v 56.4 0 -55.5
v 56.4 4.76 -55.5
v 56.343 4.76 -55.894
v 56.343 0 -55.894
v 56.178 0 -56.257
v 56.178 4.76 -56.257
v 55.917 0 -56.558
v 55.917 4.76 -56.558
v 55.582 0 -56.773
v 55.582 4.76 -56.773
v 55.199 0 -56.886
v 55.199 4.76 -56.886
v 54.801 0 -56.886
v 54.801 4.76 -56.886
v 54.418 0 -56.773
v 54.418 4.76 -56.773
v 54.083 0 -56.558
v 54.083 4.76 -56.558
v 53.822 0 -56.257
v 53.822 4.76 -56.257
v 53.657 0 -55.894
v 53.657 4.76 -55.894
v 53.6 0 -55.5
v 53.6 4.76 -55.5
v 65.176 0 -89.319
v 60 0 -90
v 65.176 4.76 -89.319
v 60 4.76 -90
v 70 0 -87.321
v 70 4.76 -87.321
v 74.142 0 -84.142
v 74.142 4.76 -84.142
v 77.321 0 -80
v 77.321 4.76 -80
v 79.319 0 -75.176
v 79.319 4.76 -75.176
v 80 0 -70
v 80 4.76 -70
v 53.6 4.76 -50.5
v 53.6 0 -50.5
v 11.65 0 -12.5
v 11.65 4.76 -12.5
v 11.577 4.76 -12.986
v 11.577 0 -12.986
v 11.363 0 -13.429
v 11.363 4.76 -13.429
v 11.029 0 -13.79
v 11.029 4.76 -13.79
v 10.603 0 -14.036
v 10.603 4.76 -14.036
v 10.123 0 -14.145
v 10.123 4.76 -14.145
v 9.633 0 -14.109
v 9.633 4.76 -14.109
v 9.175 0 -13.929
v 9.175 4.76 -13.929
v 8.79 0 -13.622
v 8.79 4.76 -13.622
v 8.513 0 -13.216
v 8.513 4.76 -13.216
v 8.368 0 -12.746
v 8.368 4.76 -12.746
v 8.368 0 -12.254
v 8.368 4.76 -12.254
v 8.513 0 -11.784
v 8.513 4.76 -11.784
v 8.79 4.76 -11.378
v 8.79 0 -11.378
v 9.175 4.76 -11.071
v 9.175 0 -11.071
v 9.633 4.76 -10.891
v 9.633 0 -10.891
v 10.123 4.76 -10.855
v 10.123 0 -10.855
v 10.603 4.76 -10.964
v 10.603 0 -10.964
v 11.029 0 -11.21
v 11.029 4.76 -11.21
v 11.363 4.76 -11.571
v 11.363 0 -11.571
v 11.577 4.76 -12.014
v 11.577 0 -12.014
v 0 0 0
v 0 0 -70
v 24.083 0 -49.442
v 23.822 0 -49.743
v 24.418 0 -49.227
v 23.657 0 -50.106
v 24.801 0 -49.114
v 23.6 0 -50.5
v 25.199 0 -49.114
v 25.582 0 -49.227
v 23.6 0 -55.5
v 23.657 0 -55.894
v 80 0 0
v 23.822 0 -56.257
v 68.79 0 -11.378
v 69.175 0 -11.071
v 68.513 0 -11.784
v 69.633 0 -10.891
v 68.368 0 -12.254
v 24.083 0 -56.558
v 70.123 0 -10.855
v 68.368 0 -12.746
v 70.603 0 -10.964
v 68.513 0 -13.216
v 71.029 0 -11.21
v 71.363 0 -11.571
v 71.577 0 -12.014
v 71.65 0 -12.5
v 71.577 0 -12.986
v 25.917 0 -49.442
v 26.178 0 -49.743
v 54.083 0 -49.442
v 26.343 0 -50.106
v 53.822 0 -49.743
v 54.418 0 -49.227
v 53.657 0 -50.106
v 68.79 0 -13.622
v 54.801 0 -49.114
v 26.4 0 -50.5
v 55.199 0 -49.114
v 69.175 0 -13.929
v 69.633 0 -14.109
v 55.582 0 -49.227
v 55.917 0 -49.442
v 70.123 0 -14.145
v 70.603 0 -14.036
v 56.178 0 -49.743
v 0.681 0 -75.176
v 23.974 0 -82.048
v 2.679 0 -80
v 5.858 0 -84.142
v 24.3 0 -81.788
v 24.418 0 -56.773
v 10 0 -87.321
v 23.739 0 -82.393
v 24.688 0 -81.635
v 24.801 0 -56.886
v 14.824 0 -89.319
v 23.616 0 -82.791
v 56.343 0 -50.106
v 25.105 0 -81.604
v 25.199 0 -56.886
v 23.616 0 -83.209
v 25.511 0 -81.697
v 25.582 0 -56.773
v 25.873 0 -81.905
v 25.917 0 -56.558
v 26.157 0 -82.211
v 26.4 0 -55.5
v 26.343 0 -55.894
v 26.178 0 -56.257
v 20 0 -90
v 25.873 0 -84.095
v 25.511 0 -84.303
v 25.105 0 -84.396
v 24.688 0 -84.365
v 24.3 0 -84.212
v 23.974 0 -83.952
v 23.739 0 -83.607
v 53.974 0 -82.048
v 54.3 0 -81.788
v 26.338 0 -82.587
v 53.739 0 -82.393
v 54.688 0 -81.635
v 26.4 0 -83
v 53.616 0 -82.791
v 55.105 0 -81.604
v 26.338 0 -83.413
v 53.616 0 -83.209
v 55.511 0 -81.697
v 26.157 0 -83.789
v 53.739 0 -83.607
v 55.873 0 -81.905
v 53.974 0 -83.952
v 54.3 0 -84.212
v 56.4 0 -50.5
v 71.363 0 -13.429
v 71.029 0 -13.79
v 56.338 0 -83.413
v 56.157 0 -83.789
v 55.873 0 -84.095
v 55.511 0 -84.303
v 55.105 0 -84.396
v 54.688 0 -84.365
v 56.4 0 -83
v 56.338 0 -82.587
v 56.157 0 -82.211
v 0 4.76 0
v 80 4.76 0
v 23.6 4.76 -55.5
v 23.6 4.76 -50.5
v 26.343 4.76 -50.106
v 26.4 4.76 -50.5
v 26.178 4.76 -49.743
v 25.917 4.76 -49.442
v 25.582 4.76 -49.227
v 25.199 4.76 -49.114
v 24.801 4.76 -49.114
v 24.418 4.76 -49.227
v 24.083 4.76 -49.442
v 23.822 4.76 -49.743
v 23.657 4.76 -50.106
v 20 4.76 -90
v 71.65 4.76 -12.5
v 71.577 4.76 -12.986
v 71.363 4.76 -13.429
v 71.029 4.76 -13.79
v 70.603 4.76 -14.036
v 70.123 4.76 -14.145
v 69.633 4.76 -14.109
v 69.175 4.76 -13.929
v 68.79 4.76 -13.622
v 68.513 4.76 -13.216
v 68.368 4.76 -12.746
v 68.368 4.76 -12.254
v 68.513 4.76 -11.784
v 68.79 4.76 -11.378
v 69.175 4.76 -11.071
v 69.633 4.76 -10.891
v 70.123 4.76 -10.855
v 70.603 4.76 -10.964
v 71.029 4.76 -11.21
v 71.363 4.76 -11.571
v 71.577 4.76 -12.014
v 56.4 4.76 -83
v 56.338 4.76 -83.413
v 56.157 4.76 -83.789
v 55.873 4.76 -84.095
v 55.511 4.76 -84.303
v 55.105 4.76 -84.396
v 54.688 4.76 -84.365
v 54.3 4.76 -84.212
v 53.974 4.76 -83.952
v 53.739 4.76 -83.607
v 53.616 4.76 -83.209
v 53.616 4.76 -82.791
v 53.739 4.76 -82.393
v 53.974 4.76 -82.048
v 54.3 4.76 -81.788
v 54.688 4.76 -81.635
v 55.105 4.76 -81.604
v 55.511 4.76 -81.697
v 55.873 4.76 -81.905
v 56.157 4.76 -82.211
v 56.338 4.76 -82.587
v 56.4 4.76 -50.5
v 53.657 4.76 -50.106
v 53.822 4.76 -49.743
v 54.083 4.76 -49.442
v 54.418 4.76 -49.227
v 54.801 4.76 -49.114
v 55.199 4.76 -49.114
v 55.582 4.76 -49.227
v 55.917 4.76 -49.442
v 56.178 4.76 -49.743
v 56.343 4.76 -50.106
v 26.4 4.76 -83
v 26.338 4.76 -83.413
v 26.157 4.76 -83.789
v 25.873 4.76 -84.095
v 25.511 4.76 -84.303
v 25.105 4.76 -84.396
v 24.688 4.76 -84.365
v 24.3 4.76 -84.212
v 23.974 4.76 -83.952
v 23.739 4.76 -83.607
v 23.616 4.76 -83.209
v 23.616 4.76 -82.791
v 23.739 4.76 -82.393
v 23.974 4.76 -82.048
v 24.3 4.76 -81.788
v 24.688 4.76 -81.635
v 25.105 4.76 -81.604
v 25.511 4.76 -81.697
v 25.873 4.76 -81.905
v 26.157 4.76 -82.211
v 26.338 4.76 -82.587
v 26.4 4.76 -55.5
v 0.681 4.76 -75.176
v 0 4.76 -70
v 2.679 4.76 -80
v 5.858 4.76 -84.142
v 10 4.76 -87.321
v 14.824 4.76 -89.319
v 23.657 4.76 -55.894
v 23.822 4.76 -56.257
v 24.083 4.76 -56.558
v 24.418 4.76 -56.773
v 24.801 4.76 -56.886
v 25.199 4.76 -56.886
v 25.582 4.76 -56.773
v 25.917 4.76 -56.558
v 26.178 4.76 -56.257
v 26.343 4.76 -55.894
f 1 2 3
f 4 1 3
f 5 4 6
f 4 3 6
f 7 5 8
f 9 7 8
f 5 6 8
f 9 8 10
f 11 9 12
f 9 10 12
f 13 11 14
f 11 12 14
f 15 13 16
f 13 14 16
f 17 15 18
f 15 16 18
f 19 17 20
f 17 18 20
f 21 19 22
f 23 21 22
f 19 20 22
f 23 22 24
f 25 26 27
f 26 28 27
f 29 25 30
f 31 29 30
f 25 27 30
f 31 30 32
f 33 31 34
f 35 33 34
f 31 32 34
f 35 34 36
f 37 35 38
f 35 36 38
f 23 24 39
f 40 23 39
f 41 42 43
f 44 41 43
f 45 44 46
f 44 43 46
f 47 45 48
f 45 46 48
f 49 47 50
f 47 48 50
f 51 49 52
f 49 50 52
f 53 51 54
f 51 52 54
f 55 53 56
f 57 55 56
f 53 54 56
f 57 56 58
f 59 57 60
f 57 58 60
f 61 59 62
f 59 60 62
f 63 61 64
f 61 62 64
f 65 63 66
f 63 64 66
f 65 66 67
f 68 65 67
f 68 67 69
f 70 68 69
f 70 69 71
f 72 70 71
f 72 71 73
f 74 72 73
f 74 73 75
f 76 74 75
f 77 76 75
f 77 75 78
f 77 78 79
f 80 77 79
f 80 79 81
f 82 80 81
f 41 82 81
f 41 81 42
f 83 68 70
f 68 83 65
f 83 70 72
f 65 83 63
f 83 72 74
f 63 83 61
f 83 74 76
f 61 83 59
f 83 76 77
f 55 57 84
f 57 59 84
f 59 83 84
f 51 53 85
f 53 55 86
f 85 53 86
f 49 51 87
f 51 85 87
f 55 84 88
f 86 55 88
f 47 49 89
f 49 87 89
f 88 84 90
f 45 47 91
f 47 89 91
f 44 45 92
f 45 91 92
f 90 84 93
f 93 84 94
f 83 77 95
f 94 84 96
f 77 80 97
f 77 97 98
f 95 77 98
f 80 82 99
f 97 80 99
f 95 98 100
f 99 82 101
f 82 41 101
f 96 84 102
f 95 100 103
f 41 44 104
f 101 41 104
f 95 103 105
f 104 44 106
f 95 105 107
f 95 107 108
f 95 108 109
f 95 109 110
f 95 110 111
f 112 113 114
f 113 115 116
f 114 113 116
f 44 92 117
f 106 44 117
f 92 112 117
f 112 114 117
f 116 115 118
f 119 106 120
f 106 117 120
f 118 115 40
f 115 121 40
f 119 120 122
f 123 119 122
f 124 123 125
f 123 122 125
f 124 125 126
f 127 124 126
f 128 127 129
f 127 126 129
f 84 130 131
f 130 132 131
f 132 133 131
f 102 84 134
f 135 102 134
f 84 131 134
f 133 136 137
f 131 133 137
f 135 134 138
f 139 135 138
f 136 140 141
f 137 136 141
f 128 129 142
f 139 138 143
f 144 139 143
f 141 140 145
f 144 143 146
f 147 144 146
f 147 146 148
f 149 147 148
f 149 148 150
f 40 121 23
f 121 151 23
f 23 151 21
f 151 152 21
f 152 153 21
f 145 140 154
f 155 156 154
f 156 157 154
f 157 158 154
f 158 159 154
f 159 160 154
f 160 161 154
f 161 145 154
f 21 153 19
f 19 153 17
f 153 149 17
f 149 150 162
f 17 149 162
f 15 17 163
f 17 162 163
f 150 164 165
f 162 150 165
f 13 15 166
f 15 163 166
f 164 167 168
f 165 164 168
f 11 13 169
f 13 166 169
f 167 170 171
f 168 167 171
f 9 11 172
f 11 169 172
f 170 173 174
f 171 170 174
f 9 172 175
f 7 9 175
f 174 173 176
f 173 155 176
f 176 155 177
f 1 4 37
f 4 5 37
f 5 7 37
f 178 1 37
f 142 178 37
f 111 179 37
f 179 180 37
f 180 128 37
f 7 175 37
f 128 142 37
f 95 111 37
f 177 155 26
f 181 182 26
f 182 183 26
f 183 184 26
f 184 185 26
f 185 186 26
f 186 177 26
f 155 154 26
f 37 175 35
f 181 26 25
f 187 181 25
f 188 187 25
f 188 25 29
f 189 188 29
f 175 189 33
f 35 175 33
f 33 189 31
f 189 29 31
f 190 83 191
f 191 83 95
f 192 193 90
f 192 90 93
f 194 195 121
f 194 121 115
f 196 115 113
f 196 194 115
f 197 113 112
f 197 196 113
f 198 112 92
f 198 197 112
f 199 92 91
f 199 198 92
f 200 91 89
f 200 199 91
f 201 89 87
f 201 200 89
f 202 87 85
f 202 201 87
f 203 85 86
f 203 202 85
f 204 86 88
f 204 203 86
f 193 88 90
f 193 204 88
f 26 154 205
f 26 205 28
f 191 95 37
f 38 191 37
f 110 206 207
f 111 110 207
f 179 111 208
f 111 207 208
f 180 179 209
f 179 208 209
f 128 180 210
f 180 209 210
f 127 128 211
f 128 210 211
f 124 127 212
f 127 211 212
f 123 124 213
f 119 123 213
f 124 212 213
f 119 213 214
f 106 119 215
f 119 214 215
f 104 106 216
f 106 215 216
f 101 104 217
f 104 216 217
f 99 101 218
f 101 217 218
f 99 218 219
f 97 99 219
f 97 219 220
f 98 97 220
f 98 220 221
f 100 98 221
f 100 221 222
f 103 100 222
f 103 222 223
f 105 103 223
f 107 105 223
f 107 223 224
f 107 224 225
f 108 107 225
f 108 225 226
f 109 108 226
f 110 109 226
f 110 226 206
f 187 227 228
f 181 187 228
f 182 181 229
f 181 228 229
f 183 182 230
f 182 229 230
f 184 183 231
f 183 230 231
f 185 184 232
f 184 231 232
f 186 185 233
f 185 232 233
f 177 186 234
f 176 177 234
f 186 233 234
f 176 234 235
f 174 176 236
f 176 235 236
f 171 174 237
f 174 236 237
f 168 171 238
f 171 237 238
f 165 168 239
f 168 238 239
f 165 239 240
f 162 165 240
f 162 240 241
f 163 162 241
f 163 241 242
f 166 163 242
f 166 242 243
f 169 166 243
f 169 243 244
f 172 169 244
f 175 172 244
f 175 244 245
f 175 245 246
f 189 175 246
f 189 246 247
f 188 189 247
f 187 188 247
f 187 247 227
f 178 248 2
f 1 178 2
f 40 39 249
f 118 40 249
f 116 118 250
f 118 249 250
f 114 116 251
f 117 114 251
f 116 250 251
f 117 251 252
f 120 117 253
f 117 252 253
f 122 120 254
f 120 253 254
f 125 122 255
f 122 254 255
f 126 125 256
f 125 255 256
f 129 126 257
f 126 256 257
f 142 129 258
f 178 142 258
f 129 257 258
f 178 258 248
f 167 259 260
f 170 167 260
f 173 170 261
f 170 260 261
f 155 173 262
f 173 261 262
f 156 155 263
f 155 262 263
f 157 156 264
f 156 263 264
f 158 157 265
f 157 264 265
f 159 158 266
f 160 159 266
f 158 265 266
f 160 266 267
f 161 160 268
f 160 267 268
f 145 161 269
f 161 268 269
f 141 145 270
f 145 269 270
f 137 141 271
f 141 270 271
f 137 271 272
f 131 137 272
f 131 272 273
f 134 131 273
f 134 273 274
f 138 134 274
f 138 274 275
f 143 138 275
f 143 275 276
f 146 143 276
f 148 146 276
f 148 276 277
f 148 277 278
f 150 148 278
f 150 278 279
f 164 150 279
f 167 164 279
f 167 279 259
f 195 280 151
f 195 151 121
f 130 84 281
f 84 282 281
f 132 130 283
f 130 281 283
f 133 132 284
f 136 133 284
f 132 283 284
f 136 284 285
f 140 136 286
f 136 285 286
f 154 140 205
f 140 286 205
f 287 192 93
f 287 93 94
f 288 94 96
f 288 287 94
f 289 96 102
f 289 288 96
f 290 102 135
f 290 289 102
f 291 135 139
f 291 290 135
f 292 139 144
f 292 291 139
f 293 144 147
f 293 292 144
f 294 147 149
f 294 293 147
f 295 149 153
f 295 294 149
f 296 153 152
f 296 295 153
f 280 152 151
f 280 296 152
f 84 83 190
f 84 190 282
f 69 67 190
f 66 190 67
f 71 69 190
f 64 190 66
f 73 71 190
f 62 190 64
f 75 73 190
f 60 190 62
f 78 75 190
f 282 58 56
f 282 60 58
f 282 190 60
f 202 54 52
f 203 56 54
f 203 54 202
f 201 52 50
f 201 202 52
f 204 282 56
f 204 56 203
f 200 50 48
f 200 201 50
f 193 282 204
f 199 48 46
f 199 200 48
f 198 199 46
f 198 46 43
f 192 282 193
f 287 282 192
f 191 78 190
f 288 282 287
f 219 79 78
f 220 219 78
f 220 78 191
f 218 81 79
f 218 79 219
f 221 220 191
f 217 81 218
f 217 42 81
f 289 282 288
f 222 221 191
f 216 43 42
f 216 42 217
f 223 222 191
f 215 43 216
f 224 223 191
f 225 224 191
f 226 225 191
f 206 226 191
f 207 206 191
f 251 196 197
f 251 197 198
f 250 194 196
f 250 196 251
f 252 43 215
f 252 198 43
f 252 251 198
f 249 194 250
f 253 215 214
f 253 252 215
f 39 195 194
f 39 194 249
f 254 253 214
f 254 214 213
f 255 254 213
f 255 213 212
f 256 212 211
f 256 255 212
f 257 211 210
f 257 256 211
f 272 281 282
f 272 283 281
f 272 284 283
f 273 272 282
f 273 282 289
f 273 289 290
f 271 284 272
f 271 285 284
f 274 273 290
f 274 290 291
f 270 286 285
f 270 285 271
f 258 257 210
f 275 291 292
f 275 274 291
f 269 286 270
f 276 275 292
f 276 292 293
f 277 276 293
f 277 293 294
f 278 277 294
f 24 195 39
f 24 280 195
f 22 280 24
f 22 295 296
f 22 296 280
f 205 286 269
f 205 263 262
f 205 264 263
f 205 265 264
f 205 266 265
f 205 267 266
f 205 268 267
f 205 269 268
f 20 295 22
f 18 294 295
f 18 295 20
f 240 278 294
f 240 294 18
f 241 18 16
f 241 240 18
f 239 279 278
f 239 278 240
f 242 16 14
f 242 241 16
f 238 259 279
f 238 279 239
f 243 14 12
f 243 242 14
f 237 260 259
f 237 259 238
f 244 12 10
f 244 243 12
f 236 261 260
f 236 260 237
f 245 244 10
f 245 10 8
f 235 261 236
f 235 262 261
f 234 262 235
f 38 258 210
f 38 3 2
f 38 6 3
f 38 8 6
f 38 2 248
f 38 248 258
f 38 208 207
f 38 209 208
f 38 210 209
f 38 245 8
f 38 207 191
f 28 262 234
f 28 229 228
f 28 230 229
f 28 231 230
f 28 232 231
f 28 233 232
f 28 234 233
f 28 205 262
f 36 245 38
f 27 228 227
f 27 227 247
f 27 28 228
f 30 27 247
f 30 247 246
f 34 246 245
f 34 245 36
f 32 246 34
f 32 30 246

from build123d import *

# Parameters (mm, degrees)
SKETCH1_W           = 80
SKETCH1_H           = 90
BOSS_EXTRUDE1_DEPTH = 4.76
SKETCH2_R           = 1.65
SKETCH2_R_2         = 1.4
CUT_EXTRUDE1_DEPTH  = 5.76
FILLET1_R           = 20


with BuildPart() as part:
    # Sketch1 → Boss-Extrude1 (new body)
    with BuildSketch(Plane(origin=(0, 0, 0), x_dir=(1, 0, 0), z_dir=(0, 1, 0))):
        with Locations((40, 45)):
            Rectangle(SKETCH1_W, SKETCH1_H)
    extrude(amount=BOSS_EXTRUDE1_DEPTH)

    # Sketch2 → Cut-Extrude1 (cut, through all)
    with BuildSketch(Plane(origin=(0, 4.76, 0), x_dir=(1, 0, 0), z_dir=(0, 1, 0))):
        with Locations((10, 12.5)):
            Circle(SKETCH2_R)
        with Locations((70, 12.5)):
            Circle(SKETCH2_R)
        with Locations((25, 83)):
            Circle(SKETCH2_R_2)
        with Locations((55, 83)):
            Circle(SKETCH2_R_2)
        with BuildLine():
            Line((26.4, 55.5), (26.4, 50.5))
            ThreePointArc((26.4, 50.5), (25, 49.1), (23.6, 50.5))
            Line((23.6, 50.5), (23.6, 55.5))
            ThreePointArc((23.6, 55.5), (25, 56.9), (26.4, 55.5))
        make_face()
        with BuildLine():
            Line((53.6, 55.5), (53.6, 50.5))
            ThreePointArc((53.6, 50.5), (55, 49.1), (56.4, 50.5))
            Line((56.4, 50.5), (56.4, 55.5))
            ThreePointArc((56.4, 55.5), (55, 56.9), (53.6, 55.5))
        make_face()
    extrude(amount=-CUT_EXTRUDE1_DEPTH, mode=Mode.SUBTRACT)

    # Fillet1
    fillet1_edges = [part.edges().sort_by_distance(p)[0] for p in [
        (0, 2.38, -90),
        (80, 2.38, -90),
    ]]
    fillet(fillet1_edges, radius=FILLET1_R)


solid = part.part
